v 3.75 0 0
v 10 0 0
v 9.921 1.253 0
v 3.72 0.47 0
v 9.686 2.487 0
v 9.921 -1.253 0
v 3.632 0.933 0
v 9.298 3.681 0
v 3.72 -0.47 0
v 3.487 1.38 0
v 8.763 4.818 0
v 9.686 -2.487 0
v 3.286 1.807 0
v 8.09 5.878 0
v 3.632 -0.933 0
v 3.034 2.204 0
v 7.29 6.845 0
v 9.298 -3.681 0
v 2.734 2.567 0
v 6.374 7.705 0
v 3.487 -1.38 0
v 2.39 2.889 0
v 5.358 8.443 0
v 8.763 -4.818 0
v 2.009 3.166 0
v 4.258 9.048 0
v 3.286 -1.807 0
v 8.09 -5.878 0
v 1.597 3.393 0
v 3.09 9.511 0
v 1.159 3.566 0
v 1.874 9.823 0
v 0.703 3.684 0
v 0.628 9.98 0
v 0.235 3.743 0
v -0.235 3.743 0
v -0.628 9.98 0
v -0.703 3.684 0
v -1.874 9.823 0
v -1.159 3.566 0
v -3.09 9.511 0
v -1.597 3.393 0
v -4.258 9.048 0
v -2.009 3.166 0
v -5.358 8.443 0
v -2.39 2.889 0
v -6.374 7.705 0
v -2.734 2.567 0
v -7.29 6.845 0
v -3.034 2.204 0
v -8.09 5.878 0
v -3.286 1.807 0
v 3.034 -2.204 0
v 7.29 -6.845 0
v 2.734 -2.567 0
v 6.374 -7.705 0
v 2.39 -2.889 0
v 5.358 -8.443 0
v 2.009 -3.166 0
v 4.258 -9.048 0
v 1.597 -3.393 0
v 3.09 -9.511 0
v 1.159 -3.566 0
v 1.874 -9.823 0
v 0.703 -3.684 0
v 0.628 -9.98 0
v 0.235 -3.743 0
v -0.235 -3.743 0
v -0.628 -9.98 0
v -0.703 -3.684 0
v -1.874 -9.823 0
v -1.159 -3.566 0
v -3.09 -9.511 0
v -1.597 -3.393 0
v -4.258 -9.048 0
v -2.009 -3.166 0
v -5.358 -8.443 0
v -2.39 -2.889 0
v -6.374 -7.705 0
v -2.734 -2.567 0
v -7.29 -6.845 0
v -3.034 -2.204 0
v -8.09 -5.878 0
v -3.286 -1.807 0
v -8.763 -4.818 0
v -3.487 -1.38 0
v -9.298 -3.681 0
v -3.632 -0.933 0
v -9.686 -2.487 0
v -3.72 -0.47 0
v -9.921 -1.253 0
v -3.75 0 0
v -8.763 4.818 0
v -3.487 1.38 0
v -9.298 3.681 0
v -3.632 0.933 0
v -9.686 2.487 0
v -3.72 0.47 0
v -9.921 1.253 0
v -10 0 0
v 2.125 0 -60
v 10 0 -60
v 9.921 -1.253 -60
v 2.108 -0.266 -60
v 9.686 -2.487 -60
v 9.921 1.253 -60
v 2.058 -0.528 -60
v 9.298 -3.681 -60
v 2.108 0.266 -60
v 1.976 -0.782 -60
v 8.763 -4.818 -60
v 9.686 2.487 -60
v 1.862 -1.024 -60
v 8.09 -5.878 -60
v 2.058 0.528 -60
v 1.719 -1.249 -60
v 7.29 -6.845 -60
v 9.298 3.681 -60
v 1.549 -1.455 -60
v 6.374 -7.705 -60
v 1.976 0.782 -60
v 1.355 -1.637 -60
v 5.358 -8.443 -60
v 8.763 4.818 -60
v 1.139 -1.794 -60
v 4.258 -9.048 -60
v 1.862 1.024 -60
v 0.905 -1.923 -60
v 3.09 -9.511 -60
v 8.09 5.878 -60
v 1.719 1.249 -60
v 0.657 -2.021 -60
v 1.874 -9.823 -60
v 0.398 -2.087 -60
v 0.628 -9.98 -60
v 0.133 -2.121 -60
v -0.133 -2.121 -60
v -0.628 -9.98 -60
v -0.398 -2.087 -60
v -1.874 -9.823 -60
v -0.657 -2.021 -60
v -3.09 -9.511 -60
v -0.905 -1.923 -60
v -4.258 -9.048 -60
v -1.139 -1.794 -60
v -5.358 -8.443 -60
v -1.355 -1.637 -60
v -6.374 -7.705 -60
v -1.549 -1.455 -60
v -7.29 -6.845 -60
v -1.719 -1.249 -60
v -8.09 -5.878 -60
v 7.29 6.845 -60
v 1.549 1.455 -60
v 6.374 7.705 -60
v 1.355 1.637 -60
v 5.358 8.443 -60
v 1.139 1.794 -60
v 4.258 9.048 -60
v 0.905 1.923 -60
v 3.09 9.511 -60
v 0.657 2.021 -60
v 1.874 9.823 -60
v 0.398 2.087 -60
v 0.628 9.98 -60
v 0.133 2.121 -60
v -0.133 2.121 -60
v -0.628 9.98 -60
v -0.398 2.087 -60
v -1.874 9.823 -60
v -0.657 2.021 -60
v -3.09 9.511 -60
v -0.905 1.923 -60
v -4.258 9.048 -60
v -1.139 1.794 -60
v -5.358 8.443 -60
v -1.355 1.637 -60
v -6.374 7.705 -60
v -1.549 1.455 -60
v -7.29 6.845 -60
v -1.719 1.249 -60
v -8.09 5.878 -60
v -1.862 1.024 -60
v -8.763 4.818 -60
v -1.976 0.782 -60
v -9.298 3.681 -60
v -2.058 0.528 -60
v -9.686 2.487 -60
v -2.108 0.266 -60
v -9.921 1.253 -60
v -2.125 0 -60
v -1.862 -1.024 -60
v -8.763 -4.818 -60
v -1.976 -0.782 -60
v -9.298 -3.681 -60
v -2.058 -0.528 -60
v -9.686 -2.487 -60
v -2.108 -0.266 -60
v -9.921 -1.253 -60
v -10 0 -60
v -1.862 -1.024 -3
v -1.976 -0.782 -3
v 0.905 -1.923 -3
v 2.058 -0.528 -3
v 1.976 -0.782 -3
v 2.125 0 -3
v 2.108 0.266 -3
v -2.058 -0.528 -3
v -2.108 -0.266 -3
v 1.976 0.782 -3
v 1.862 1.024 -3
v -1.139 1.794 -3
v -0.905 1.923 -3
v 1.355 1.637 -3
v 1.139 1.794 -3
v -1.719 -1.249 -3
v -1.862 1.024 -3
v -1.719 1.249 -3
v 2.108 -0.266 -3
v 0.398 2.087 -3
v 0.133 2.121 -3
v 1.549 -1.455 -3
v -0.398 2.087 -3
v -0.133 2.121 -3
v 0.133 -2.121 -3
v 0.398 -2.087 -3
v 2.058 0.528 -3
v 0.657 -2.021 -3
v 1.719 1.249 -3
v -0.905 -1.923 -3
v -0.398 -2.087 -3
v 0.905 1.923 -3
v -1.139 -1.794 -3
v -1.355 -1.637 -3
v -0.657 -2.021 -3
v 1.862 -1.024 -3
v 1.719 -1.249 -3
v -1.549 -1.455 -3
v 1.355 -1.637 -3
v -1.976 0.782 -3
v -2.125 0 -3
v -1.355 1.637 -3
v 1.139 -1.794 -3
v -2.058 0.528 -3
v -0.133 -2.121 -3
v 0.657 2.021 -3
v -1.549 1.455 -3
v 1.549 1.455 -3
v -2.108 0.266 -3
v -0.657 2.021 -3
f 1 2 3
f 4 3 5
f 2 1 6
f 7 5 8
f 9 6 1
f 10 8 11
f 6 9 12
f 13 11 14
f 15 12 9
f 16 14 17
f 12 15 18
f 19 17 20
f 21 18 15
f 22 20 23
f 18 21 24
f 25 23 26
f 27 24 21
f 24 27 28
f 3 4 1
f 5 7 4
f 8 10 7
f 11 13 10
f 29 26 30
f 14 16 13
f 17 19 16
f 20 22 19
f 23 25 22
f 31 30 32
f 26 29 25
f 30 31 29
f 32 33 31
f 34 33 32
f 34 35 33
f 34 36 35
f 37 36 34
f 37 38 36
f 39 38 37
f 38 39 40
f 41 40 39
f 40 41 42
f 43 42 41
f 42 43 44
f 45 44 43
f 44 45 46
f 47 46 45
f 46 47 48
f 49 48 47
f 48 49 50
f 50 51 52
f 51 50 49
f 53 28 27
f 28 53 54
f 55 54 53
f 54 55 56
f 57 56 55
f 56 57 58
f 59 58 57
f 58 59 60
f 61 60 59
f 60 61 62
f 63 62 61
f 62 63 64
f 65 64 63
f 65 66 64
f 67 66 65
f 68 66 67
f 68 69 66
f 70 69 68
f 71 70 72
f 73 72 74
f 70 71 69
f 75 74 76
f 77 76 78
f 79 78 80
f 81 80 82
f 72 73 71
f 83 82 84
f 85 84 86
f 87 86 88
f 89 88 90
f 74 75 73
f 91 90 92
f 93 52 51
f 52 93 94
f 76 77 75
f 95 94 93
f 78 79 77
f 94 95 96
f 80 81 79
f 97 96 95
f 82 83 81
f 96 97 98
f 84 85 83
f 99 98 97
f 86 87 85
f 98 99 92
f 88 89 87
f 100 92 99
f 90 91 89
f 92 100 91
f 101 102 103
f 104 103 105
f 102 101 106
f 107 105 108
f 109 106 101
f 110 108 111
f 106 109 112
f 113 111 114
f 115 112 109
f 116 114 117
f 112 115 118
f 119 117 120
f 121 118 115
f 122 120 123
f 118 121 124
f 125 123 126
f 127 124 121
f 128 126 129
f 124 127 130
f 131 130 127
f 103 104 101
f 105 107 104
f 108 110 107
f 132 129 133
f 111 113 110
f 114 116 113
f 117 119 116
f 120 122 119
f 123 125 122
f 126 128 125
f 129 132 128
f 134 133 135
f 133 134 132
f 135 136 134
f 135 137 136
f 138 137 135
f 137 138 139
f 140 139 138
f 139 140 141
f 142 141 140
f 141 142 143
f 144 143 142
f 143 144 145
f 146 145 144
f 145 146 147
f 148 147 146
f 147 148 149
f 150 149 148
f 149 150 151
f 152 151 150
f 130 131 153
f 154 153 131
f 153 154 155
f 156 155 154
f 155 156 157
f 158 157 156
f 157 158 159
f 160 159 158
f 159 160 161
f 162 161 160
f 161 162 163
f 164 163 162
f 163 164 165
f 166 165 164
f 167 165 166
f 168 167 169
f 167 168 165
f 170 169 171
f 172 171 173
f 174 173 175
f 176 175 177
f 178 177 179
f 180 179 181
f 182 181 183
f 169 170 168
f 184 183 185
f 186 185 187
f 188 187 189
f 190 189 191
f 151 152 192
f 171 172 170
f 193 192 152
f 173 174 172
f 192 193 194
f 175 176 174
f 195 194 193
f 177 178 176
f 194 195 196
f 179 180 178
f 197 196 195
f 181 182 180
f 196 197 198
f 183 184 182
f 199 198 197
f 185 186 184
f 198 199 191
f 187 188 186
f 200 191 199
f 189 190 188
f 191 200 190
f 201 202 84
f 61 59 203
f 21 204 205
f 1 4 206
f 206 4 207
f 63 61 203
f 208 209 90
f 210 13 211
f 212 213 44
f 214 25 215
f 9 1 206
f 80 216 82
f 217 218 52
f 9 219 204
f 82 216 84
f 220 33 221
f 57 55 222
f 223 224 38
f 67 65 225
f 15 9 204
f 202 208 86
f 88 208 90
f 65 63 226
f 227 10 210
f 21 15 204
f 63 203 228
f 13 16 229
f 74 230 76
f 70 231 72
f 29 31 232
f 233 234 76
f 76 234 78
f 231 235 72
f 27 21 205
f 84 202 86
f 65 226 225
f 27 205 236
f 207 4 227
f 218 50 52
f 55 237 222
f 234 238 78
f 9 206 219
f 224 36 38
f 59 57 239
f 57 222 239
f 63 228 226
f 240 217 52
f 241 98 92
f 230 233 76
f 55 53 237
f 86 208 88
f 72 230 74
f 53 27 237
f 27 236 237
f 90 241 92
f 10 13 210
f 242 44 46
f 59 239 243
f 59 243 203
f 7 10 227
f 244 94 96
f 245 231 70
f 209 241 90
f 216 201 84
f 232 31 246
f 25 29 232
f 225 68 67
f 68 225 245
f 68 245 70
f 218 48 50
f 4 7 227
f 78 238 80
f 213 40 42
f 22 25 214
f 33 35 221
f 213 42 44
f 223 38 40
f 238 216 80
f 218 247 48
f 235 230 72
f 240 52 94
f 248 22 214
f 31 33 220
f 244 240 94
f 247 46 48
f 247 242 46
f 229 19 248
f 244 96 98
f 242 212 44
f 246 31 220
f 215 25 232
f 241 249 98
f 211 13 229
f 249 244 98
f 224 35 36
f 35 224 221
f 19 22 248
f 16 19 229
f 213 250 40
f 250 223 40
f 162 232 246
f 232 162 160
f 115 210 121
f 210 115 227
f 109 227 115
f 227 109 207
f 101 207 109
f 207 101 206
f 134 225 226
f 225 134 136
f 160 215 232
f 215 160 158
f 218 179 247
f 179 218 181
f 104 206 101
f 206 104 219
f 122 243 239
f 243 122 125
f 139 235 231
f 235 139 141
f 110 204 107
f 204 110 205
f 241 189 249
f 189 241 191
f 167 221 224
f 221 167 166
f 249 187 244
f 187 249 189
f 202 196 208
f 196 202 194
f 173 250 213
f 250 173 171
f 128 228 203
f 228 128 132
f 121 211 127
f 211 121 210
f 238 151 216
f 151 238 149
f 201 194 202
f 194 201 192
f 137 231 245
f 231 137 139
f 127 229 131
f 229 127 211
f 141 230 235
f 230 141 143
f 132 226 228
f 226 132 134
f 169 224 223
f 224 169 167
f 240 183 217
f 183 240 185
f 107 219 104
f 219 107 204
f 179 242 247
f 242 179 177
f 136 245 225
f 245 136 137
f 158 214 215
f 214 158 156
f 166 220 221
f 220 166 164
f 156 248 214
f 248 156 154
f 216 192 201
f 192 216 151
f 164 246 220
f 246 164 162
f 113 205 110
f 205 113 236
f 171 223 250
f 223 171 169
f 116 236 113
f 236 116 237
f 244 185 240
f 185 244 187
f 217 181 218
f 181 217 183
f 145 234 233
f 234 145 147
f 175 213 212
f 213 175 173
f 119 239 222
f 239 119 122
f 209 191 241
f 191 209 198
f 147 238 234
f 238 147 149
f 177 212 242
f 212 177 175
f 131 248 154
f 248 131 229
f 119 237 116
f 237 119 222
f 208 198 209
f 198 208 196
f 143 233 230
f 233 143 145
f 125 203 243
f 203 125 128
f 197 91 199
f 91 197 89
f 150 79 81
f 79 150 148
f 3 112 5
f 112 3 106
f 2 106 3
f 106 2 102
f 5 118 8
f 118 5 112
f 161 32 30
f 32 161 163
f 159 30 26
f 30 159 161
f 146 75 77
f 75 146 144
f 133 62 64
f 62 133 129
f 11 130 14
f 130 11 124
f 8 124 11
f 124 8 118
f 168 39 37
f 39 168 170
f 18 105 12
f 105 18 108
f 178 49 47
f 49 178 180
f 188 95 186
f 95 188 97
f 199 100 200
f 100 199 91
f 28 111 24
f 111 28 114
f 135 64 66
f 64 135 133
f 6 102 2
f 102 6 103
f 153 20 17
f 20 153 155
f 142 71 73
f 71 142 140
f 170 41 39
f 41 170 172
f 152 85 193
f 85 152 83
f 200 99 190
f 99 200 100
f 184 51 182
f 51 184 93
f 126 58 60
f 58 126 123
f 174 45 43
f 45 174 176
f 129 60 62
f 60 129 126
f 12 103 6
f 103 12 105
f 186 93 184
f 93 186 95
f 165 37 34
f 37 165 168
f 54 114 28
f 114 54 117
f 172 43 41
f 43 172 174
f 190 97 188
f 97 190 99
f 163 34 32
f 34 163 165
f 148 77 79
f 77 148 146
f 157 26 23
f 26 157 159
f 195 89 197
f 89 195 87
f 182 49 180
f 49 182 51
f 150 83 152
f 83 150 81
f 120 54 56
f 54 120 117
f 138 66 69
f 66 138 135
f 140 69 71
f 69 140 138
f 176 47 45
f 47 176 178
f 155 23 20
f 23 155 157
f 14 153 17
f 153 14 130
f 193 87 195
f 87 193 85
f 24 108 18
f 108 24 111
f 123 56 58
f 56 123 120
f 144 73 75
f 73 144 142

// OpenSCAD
$fn = 50;


difference() {
	union() {
		translate(v = [0, 0, -60.0000000000]) {
			cylinder(h = 60, r = 10.0000000000);
		}
	}
	union() {
		translate(v = [0, 0, 0]) {
			rotate(a = [0, 0, 0]) {
				difference() {
					union() {
						#translate(v = [0, 0, -60.0000000000]) {
							cylinder(h = 60, r = 2.0000000000);
						}
						#translate(v = [0, 0, -3]) {
							cylinder(h = 3, r1 = 2.1250000000, r2 = 3.7500000000);
						}
						#translate(v = [0, 0, -60.0000000000]) {
							cylinder(h = 60, r = 2.1250000000);
						}
						#translate(v = [0, 0, -60.0000000000]) {
							cylinder(h = 60, r = 2.0000000000);
						}
					}
					union();
				}
			}
		}
	}
}
